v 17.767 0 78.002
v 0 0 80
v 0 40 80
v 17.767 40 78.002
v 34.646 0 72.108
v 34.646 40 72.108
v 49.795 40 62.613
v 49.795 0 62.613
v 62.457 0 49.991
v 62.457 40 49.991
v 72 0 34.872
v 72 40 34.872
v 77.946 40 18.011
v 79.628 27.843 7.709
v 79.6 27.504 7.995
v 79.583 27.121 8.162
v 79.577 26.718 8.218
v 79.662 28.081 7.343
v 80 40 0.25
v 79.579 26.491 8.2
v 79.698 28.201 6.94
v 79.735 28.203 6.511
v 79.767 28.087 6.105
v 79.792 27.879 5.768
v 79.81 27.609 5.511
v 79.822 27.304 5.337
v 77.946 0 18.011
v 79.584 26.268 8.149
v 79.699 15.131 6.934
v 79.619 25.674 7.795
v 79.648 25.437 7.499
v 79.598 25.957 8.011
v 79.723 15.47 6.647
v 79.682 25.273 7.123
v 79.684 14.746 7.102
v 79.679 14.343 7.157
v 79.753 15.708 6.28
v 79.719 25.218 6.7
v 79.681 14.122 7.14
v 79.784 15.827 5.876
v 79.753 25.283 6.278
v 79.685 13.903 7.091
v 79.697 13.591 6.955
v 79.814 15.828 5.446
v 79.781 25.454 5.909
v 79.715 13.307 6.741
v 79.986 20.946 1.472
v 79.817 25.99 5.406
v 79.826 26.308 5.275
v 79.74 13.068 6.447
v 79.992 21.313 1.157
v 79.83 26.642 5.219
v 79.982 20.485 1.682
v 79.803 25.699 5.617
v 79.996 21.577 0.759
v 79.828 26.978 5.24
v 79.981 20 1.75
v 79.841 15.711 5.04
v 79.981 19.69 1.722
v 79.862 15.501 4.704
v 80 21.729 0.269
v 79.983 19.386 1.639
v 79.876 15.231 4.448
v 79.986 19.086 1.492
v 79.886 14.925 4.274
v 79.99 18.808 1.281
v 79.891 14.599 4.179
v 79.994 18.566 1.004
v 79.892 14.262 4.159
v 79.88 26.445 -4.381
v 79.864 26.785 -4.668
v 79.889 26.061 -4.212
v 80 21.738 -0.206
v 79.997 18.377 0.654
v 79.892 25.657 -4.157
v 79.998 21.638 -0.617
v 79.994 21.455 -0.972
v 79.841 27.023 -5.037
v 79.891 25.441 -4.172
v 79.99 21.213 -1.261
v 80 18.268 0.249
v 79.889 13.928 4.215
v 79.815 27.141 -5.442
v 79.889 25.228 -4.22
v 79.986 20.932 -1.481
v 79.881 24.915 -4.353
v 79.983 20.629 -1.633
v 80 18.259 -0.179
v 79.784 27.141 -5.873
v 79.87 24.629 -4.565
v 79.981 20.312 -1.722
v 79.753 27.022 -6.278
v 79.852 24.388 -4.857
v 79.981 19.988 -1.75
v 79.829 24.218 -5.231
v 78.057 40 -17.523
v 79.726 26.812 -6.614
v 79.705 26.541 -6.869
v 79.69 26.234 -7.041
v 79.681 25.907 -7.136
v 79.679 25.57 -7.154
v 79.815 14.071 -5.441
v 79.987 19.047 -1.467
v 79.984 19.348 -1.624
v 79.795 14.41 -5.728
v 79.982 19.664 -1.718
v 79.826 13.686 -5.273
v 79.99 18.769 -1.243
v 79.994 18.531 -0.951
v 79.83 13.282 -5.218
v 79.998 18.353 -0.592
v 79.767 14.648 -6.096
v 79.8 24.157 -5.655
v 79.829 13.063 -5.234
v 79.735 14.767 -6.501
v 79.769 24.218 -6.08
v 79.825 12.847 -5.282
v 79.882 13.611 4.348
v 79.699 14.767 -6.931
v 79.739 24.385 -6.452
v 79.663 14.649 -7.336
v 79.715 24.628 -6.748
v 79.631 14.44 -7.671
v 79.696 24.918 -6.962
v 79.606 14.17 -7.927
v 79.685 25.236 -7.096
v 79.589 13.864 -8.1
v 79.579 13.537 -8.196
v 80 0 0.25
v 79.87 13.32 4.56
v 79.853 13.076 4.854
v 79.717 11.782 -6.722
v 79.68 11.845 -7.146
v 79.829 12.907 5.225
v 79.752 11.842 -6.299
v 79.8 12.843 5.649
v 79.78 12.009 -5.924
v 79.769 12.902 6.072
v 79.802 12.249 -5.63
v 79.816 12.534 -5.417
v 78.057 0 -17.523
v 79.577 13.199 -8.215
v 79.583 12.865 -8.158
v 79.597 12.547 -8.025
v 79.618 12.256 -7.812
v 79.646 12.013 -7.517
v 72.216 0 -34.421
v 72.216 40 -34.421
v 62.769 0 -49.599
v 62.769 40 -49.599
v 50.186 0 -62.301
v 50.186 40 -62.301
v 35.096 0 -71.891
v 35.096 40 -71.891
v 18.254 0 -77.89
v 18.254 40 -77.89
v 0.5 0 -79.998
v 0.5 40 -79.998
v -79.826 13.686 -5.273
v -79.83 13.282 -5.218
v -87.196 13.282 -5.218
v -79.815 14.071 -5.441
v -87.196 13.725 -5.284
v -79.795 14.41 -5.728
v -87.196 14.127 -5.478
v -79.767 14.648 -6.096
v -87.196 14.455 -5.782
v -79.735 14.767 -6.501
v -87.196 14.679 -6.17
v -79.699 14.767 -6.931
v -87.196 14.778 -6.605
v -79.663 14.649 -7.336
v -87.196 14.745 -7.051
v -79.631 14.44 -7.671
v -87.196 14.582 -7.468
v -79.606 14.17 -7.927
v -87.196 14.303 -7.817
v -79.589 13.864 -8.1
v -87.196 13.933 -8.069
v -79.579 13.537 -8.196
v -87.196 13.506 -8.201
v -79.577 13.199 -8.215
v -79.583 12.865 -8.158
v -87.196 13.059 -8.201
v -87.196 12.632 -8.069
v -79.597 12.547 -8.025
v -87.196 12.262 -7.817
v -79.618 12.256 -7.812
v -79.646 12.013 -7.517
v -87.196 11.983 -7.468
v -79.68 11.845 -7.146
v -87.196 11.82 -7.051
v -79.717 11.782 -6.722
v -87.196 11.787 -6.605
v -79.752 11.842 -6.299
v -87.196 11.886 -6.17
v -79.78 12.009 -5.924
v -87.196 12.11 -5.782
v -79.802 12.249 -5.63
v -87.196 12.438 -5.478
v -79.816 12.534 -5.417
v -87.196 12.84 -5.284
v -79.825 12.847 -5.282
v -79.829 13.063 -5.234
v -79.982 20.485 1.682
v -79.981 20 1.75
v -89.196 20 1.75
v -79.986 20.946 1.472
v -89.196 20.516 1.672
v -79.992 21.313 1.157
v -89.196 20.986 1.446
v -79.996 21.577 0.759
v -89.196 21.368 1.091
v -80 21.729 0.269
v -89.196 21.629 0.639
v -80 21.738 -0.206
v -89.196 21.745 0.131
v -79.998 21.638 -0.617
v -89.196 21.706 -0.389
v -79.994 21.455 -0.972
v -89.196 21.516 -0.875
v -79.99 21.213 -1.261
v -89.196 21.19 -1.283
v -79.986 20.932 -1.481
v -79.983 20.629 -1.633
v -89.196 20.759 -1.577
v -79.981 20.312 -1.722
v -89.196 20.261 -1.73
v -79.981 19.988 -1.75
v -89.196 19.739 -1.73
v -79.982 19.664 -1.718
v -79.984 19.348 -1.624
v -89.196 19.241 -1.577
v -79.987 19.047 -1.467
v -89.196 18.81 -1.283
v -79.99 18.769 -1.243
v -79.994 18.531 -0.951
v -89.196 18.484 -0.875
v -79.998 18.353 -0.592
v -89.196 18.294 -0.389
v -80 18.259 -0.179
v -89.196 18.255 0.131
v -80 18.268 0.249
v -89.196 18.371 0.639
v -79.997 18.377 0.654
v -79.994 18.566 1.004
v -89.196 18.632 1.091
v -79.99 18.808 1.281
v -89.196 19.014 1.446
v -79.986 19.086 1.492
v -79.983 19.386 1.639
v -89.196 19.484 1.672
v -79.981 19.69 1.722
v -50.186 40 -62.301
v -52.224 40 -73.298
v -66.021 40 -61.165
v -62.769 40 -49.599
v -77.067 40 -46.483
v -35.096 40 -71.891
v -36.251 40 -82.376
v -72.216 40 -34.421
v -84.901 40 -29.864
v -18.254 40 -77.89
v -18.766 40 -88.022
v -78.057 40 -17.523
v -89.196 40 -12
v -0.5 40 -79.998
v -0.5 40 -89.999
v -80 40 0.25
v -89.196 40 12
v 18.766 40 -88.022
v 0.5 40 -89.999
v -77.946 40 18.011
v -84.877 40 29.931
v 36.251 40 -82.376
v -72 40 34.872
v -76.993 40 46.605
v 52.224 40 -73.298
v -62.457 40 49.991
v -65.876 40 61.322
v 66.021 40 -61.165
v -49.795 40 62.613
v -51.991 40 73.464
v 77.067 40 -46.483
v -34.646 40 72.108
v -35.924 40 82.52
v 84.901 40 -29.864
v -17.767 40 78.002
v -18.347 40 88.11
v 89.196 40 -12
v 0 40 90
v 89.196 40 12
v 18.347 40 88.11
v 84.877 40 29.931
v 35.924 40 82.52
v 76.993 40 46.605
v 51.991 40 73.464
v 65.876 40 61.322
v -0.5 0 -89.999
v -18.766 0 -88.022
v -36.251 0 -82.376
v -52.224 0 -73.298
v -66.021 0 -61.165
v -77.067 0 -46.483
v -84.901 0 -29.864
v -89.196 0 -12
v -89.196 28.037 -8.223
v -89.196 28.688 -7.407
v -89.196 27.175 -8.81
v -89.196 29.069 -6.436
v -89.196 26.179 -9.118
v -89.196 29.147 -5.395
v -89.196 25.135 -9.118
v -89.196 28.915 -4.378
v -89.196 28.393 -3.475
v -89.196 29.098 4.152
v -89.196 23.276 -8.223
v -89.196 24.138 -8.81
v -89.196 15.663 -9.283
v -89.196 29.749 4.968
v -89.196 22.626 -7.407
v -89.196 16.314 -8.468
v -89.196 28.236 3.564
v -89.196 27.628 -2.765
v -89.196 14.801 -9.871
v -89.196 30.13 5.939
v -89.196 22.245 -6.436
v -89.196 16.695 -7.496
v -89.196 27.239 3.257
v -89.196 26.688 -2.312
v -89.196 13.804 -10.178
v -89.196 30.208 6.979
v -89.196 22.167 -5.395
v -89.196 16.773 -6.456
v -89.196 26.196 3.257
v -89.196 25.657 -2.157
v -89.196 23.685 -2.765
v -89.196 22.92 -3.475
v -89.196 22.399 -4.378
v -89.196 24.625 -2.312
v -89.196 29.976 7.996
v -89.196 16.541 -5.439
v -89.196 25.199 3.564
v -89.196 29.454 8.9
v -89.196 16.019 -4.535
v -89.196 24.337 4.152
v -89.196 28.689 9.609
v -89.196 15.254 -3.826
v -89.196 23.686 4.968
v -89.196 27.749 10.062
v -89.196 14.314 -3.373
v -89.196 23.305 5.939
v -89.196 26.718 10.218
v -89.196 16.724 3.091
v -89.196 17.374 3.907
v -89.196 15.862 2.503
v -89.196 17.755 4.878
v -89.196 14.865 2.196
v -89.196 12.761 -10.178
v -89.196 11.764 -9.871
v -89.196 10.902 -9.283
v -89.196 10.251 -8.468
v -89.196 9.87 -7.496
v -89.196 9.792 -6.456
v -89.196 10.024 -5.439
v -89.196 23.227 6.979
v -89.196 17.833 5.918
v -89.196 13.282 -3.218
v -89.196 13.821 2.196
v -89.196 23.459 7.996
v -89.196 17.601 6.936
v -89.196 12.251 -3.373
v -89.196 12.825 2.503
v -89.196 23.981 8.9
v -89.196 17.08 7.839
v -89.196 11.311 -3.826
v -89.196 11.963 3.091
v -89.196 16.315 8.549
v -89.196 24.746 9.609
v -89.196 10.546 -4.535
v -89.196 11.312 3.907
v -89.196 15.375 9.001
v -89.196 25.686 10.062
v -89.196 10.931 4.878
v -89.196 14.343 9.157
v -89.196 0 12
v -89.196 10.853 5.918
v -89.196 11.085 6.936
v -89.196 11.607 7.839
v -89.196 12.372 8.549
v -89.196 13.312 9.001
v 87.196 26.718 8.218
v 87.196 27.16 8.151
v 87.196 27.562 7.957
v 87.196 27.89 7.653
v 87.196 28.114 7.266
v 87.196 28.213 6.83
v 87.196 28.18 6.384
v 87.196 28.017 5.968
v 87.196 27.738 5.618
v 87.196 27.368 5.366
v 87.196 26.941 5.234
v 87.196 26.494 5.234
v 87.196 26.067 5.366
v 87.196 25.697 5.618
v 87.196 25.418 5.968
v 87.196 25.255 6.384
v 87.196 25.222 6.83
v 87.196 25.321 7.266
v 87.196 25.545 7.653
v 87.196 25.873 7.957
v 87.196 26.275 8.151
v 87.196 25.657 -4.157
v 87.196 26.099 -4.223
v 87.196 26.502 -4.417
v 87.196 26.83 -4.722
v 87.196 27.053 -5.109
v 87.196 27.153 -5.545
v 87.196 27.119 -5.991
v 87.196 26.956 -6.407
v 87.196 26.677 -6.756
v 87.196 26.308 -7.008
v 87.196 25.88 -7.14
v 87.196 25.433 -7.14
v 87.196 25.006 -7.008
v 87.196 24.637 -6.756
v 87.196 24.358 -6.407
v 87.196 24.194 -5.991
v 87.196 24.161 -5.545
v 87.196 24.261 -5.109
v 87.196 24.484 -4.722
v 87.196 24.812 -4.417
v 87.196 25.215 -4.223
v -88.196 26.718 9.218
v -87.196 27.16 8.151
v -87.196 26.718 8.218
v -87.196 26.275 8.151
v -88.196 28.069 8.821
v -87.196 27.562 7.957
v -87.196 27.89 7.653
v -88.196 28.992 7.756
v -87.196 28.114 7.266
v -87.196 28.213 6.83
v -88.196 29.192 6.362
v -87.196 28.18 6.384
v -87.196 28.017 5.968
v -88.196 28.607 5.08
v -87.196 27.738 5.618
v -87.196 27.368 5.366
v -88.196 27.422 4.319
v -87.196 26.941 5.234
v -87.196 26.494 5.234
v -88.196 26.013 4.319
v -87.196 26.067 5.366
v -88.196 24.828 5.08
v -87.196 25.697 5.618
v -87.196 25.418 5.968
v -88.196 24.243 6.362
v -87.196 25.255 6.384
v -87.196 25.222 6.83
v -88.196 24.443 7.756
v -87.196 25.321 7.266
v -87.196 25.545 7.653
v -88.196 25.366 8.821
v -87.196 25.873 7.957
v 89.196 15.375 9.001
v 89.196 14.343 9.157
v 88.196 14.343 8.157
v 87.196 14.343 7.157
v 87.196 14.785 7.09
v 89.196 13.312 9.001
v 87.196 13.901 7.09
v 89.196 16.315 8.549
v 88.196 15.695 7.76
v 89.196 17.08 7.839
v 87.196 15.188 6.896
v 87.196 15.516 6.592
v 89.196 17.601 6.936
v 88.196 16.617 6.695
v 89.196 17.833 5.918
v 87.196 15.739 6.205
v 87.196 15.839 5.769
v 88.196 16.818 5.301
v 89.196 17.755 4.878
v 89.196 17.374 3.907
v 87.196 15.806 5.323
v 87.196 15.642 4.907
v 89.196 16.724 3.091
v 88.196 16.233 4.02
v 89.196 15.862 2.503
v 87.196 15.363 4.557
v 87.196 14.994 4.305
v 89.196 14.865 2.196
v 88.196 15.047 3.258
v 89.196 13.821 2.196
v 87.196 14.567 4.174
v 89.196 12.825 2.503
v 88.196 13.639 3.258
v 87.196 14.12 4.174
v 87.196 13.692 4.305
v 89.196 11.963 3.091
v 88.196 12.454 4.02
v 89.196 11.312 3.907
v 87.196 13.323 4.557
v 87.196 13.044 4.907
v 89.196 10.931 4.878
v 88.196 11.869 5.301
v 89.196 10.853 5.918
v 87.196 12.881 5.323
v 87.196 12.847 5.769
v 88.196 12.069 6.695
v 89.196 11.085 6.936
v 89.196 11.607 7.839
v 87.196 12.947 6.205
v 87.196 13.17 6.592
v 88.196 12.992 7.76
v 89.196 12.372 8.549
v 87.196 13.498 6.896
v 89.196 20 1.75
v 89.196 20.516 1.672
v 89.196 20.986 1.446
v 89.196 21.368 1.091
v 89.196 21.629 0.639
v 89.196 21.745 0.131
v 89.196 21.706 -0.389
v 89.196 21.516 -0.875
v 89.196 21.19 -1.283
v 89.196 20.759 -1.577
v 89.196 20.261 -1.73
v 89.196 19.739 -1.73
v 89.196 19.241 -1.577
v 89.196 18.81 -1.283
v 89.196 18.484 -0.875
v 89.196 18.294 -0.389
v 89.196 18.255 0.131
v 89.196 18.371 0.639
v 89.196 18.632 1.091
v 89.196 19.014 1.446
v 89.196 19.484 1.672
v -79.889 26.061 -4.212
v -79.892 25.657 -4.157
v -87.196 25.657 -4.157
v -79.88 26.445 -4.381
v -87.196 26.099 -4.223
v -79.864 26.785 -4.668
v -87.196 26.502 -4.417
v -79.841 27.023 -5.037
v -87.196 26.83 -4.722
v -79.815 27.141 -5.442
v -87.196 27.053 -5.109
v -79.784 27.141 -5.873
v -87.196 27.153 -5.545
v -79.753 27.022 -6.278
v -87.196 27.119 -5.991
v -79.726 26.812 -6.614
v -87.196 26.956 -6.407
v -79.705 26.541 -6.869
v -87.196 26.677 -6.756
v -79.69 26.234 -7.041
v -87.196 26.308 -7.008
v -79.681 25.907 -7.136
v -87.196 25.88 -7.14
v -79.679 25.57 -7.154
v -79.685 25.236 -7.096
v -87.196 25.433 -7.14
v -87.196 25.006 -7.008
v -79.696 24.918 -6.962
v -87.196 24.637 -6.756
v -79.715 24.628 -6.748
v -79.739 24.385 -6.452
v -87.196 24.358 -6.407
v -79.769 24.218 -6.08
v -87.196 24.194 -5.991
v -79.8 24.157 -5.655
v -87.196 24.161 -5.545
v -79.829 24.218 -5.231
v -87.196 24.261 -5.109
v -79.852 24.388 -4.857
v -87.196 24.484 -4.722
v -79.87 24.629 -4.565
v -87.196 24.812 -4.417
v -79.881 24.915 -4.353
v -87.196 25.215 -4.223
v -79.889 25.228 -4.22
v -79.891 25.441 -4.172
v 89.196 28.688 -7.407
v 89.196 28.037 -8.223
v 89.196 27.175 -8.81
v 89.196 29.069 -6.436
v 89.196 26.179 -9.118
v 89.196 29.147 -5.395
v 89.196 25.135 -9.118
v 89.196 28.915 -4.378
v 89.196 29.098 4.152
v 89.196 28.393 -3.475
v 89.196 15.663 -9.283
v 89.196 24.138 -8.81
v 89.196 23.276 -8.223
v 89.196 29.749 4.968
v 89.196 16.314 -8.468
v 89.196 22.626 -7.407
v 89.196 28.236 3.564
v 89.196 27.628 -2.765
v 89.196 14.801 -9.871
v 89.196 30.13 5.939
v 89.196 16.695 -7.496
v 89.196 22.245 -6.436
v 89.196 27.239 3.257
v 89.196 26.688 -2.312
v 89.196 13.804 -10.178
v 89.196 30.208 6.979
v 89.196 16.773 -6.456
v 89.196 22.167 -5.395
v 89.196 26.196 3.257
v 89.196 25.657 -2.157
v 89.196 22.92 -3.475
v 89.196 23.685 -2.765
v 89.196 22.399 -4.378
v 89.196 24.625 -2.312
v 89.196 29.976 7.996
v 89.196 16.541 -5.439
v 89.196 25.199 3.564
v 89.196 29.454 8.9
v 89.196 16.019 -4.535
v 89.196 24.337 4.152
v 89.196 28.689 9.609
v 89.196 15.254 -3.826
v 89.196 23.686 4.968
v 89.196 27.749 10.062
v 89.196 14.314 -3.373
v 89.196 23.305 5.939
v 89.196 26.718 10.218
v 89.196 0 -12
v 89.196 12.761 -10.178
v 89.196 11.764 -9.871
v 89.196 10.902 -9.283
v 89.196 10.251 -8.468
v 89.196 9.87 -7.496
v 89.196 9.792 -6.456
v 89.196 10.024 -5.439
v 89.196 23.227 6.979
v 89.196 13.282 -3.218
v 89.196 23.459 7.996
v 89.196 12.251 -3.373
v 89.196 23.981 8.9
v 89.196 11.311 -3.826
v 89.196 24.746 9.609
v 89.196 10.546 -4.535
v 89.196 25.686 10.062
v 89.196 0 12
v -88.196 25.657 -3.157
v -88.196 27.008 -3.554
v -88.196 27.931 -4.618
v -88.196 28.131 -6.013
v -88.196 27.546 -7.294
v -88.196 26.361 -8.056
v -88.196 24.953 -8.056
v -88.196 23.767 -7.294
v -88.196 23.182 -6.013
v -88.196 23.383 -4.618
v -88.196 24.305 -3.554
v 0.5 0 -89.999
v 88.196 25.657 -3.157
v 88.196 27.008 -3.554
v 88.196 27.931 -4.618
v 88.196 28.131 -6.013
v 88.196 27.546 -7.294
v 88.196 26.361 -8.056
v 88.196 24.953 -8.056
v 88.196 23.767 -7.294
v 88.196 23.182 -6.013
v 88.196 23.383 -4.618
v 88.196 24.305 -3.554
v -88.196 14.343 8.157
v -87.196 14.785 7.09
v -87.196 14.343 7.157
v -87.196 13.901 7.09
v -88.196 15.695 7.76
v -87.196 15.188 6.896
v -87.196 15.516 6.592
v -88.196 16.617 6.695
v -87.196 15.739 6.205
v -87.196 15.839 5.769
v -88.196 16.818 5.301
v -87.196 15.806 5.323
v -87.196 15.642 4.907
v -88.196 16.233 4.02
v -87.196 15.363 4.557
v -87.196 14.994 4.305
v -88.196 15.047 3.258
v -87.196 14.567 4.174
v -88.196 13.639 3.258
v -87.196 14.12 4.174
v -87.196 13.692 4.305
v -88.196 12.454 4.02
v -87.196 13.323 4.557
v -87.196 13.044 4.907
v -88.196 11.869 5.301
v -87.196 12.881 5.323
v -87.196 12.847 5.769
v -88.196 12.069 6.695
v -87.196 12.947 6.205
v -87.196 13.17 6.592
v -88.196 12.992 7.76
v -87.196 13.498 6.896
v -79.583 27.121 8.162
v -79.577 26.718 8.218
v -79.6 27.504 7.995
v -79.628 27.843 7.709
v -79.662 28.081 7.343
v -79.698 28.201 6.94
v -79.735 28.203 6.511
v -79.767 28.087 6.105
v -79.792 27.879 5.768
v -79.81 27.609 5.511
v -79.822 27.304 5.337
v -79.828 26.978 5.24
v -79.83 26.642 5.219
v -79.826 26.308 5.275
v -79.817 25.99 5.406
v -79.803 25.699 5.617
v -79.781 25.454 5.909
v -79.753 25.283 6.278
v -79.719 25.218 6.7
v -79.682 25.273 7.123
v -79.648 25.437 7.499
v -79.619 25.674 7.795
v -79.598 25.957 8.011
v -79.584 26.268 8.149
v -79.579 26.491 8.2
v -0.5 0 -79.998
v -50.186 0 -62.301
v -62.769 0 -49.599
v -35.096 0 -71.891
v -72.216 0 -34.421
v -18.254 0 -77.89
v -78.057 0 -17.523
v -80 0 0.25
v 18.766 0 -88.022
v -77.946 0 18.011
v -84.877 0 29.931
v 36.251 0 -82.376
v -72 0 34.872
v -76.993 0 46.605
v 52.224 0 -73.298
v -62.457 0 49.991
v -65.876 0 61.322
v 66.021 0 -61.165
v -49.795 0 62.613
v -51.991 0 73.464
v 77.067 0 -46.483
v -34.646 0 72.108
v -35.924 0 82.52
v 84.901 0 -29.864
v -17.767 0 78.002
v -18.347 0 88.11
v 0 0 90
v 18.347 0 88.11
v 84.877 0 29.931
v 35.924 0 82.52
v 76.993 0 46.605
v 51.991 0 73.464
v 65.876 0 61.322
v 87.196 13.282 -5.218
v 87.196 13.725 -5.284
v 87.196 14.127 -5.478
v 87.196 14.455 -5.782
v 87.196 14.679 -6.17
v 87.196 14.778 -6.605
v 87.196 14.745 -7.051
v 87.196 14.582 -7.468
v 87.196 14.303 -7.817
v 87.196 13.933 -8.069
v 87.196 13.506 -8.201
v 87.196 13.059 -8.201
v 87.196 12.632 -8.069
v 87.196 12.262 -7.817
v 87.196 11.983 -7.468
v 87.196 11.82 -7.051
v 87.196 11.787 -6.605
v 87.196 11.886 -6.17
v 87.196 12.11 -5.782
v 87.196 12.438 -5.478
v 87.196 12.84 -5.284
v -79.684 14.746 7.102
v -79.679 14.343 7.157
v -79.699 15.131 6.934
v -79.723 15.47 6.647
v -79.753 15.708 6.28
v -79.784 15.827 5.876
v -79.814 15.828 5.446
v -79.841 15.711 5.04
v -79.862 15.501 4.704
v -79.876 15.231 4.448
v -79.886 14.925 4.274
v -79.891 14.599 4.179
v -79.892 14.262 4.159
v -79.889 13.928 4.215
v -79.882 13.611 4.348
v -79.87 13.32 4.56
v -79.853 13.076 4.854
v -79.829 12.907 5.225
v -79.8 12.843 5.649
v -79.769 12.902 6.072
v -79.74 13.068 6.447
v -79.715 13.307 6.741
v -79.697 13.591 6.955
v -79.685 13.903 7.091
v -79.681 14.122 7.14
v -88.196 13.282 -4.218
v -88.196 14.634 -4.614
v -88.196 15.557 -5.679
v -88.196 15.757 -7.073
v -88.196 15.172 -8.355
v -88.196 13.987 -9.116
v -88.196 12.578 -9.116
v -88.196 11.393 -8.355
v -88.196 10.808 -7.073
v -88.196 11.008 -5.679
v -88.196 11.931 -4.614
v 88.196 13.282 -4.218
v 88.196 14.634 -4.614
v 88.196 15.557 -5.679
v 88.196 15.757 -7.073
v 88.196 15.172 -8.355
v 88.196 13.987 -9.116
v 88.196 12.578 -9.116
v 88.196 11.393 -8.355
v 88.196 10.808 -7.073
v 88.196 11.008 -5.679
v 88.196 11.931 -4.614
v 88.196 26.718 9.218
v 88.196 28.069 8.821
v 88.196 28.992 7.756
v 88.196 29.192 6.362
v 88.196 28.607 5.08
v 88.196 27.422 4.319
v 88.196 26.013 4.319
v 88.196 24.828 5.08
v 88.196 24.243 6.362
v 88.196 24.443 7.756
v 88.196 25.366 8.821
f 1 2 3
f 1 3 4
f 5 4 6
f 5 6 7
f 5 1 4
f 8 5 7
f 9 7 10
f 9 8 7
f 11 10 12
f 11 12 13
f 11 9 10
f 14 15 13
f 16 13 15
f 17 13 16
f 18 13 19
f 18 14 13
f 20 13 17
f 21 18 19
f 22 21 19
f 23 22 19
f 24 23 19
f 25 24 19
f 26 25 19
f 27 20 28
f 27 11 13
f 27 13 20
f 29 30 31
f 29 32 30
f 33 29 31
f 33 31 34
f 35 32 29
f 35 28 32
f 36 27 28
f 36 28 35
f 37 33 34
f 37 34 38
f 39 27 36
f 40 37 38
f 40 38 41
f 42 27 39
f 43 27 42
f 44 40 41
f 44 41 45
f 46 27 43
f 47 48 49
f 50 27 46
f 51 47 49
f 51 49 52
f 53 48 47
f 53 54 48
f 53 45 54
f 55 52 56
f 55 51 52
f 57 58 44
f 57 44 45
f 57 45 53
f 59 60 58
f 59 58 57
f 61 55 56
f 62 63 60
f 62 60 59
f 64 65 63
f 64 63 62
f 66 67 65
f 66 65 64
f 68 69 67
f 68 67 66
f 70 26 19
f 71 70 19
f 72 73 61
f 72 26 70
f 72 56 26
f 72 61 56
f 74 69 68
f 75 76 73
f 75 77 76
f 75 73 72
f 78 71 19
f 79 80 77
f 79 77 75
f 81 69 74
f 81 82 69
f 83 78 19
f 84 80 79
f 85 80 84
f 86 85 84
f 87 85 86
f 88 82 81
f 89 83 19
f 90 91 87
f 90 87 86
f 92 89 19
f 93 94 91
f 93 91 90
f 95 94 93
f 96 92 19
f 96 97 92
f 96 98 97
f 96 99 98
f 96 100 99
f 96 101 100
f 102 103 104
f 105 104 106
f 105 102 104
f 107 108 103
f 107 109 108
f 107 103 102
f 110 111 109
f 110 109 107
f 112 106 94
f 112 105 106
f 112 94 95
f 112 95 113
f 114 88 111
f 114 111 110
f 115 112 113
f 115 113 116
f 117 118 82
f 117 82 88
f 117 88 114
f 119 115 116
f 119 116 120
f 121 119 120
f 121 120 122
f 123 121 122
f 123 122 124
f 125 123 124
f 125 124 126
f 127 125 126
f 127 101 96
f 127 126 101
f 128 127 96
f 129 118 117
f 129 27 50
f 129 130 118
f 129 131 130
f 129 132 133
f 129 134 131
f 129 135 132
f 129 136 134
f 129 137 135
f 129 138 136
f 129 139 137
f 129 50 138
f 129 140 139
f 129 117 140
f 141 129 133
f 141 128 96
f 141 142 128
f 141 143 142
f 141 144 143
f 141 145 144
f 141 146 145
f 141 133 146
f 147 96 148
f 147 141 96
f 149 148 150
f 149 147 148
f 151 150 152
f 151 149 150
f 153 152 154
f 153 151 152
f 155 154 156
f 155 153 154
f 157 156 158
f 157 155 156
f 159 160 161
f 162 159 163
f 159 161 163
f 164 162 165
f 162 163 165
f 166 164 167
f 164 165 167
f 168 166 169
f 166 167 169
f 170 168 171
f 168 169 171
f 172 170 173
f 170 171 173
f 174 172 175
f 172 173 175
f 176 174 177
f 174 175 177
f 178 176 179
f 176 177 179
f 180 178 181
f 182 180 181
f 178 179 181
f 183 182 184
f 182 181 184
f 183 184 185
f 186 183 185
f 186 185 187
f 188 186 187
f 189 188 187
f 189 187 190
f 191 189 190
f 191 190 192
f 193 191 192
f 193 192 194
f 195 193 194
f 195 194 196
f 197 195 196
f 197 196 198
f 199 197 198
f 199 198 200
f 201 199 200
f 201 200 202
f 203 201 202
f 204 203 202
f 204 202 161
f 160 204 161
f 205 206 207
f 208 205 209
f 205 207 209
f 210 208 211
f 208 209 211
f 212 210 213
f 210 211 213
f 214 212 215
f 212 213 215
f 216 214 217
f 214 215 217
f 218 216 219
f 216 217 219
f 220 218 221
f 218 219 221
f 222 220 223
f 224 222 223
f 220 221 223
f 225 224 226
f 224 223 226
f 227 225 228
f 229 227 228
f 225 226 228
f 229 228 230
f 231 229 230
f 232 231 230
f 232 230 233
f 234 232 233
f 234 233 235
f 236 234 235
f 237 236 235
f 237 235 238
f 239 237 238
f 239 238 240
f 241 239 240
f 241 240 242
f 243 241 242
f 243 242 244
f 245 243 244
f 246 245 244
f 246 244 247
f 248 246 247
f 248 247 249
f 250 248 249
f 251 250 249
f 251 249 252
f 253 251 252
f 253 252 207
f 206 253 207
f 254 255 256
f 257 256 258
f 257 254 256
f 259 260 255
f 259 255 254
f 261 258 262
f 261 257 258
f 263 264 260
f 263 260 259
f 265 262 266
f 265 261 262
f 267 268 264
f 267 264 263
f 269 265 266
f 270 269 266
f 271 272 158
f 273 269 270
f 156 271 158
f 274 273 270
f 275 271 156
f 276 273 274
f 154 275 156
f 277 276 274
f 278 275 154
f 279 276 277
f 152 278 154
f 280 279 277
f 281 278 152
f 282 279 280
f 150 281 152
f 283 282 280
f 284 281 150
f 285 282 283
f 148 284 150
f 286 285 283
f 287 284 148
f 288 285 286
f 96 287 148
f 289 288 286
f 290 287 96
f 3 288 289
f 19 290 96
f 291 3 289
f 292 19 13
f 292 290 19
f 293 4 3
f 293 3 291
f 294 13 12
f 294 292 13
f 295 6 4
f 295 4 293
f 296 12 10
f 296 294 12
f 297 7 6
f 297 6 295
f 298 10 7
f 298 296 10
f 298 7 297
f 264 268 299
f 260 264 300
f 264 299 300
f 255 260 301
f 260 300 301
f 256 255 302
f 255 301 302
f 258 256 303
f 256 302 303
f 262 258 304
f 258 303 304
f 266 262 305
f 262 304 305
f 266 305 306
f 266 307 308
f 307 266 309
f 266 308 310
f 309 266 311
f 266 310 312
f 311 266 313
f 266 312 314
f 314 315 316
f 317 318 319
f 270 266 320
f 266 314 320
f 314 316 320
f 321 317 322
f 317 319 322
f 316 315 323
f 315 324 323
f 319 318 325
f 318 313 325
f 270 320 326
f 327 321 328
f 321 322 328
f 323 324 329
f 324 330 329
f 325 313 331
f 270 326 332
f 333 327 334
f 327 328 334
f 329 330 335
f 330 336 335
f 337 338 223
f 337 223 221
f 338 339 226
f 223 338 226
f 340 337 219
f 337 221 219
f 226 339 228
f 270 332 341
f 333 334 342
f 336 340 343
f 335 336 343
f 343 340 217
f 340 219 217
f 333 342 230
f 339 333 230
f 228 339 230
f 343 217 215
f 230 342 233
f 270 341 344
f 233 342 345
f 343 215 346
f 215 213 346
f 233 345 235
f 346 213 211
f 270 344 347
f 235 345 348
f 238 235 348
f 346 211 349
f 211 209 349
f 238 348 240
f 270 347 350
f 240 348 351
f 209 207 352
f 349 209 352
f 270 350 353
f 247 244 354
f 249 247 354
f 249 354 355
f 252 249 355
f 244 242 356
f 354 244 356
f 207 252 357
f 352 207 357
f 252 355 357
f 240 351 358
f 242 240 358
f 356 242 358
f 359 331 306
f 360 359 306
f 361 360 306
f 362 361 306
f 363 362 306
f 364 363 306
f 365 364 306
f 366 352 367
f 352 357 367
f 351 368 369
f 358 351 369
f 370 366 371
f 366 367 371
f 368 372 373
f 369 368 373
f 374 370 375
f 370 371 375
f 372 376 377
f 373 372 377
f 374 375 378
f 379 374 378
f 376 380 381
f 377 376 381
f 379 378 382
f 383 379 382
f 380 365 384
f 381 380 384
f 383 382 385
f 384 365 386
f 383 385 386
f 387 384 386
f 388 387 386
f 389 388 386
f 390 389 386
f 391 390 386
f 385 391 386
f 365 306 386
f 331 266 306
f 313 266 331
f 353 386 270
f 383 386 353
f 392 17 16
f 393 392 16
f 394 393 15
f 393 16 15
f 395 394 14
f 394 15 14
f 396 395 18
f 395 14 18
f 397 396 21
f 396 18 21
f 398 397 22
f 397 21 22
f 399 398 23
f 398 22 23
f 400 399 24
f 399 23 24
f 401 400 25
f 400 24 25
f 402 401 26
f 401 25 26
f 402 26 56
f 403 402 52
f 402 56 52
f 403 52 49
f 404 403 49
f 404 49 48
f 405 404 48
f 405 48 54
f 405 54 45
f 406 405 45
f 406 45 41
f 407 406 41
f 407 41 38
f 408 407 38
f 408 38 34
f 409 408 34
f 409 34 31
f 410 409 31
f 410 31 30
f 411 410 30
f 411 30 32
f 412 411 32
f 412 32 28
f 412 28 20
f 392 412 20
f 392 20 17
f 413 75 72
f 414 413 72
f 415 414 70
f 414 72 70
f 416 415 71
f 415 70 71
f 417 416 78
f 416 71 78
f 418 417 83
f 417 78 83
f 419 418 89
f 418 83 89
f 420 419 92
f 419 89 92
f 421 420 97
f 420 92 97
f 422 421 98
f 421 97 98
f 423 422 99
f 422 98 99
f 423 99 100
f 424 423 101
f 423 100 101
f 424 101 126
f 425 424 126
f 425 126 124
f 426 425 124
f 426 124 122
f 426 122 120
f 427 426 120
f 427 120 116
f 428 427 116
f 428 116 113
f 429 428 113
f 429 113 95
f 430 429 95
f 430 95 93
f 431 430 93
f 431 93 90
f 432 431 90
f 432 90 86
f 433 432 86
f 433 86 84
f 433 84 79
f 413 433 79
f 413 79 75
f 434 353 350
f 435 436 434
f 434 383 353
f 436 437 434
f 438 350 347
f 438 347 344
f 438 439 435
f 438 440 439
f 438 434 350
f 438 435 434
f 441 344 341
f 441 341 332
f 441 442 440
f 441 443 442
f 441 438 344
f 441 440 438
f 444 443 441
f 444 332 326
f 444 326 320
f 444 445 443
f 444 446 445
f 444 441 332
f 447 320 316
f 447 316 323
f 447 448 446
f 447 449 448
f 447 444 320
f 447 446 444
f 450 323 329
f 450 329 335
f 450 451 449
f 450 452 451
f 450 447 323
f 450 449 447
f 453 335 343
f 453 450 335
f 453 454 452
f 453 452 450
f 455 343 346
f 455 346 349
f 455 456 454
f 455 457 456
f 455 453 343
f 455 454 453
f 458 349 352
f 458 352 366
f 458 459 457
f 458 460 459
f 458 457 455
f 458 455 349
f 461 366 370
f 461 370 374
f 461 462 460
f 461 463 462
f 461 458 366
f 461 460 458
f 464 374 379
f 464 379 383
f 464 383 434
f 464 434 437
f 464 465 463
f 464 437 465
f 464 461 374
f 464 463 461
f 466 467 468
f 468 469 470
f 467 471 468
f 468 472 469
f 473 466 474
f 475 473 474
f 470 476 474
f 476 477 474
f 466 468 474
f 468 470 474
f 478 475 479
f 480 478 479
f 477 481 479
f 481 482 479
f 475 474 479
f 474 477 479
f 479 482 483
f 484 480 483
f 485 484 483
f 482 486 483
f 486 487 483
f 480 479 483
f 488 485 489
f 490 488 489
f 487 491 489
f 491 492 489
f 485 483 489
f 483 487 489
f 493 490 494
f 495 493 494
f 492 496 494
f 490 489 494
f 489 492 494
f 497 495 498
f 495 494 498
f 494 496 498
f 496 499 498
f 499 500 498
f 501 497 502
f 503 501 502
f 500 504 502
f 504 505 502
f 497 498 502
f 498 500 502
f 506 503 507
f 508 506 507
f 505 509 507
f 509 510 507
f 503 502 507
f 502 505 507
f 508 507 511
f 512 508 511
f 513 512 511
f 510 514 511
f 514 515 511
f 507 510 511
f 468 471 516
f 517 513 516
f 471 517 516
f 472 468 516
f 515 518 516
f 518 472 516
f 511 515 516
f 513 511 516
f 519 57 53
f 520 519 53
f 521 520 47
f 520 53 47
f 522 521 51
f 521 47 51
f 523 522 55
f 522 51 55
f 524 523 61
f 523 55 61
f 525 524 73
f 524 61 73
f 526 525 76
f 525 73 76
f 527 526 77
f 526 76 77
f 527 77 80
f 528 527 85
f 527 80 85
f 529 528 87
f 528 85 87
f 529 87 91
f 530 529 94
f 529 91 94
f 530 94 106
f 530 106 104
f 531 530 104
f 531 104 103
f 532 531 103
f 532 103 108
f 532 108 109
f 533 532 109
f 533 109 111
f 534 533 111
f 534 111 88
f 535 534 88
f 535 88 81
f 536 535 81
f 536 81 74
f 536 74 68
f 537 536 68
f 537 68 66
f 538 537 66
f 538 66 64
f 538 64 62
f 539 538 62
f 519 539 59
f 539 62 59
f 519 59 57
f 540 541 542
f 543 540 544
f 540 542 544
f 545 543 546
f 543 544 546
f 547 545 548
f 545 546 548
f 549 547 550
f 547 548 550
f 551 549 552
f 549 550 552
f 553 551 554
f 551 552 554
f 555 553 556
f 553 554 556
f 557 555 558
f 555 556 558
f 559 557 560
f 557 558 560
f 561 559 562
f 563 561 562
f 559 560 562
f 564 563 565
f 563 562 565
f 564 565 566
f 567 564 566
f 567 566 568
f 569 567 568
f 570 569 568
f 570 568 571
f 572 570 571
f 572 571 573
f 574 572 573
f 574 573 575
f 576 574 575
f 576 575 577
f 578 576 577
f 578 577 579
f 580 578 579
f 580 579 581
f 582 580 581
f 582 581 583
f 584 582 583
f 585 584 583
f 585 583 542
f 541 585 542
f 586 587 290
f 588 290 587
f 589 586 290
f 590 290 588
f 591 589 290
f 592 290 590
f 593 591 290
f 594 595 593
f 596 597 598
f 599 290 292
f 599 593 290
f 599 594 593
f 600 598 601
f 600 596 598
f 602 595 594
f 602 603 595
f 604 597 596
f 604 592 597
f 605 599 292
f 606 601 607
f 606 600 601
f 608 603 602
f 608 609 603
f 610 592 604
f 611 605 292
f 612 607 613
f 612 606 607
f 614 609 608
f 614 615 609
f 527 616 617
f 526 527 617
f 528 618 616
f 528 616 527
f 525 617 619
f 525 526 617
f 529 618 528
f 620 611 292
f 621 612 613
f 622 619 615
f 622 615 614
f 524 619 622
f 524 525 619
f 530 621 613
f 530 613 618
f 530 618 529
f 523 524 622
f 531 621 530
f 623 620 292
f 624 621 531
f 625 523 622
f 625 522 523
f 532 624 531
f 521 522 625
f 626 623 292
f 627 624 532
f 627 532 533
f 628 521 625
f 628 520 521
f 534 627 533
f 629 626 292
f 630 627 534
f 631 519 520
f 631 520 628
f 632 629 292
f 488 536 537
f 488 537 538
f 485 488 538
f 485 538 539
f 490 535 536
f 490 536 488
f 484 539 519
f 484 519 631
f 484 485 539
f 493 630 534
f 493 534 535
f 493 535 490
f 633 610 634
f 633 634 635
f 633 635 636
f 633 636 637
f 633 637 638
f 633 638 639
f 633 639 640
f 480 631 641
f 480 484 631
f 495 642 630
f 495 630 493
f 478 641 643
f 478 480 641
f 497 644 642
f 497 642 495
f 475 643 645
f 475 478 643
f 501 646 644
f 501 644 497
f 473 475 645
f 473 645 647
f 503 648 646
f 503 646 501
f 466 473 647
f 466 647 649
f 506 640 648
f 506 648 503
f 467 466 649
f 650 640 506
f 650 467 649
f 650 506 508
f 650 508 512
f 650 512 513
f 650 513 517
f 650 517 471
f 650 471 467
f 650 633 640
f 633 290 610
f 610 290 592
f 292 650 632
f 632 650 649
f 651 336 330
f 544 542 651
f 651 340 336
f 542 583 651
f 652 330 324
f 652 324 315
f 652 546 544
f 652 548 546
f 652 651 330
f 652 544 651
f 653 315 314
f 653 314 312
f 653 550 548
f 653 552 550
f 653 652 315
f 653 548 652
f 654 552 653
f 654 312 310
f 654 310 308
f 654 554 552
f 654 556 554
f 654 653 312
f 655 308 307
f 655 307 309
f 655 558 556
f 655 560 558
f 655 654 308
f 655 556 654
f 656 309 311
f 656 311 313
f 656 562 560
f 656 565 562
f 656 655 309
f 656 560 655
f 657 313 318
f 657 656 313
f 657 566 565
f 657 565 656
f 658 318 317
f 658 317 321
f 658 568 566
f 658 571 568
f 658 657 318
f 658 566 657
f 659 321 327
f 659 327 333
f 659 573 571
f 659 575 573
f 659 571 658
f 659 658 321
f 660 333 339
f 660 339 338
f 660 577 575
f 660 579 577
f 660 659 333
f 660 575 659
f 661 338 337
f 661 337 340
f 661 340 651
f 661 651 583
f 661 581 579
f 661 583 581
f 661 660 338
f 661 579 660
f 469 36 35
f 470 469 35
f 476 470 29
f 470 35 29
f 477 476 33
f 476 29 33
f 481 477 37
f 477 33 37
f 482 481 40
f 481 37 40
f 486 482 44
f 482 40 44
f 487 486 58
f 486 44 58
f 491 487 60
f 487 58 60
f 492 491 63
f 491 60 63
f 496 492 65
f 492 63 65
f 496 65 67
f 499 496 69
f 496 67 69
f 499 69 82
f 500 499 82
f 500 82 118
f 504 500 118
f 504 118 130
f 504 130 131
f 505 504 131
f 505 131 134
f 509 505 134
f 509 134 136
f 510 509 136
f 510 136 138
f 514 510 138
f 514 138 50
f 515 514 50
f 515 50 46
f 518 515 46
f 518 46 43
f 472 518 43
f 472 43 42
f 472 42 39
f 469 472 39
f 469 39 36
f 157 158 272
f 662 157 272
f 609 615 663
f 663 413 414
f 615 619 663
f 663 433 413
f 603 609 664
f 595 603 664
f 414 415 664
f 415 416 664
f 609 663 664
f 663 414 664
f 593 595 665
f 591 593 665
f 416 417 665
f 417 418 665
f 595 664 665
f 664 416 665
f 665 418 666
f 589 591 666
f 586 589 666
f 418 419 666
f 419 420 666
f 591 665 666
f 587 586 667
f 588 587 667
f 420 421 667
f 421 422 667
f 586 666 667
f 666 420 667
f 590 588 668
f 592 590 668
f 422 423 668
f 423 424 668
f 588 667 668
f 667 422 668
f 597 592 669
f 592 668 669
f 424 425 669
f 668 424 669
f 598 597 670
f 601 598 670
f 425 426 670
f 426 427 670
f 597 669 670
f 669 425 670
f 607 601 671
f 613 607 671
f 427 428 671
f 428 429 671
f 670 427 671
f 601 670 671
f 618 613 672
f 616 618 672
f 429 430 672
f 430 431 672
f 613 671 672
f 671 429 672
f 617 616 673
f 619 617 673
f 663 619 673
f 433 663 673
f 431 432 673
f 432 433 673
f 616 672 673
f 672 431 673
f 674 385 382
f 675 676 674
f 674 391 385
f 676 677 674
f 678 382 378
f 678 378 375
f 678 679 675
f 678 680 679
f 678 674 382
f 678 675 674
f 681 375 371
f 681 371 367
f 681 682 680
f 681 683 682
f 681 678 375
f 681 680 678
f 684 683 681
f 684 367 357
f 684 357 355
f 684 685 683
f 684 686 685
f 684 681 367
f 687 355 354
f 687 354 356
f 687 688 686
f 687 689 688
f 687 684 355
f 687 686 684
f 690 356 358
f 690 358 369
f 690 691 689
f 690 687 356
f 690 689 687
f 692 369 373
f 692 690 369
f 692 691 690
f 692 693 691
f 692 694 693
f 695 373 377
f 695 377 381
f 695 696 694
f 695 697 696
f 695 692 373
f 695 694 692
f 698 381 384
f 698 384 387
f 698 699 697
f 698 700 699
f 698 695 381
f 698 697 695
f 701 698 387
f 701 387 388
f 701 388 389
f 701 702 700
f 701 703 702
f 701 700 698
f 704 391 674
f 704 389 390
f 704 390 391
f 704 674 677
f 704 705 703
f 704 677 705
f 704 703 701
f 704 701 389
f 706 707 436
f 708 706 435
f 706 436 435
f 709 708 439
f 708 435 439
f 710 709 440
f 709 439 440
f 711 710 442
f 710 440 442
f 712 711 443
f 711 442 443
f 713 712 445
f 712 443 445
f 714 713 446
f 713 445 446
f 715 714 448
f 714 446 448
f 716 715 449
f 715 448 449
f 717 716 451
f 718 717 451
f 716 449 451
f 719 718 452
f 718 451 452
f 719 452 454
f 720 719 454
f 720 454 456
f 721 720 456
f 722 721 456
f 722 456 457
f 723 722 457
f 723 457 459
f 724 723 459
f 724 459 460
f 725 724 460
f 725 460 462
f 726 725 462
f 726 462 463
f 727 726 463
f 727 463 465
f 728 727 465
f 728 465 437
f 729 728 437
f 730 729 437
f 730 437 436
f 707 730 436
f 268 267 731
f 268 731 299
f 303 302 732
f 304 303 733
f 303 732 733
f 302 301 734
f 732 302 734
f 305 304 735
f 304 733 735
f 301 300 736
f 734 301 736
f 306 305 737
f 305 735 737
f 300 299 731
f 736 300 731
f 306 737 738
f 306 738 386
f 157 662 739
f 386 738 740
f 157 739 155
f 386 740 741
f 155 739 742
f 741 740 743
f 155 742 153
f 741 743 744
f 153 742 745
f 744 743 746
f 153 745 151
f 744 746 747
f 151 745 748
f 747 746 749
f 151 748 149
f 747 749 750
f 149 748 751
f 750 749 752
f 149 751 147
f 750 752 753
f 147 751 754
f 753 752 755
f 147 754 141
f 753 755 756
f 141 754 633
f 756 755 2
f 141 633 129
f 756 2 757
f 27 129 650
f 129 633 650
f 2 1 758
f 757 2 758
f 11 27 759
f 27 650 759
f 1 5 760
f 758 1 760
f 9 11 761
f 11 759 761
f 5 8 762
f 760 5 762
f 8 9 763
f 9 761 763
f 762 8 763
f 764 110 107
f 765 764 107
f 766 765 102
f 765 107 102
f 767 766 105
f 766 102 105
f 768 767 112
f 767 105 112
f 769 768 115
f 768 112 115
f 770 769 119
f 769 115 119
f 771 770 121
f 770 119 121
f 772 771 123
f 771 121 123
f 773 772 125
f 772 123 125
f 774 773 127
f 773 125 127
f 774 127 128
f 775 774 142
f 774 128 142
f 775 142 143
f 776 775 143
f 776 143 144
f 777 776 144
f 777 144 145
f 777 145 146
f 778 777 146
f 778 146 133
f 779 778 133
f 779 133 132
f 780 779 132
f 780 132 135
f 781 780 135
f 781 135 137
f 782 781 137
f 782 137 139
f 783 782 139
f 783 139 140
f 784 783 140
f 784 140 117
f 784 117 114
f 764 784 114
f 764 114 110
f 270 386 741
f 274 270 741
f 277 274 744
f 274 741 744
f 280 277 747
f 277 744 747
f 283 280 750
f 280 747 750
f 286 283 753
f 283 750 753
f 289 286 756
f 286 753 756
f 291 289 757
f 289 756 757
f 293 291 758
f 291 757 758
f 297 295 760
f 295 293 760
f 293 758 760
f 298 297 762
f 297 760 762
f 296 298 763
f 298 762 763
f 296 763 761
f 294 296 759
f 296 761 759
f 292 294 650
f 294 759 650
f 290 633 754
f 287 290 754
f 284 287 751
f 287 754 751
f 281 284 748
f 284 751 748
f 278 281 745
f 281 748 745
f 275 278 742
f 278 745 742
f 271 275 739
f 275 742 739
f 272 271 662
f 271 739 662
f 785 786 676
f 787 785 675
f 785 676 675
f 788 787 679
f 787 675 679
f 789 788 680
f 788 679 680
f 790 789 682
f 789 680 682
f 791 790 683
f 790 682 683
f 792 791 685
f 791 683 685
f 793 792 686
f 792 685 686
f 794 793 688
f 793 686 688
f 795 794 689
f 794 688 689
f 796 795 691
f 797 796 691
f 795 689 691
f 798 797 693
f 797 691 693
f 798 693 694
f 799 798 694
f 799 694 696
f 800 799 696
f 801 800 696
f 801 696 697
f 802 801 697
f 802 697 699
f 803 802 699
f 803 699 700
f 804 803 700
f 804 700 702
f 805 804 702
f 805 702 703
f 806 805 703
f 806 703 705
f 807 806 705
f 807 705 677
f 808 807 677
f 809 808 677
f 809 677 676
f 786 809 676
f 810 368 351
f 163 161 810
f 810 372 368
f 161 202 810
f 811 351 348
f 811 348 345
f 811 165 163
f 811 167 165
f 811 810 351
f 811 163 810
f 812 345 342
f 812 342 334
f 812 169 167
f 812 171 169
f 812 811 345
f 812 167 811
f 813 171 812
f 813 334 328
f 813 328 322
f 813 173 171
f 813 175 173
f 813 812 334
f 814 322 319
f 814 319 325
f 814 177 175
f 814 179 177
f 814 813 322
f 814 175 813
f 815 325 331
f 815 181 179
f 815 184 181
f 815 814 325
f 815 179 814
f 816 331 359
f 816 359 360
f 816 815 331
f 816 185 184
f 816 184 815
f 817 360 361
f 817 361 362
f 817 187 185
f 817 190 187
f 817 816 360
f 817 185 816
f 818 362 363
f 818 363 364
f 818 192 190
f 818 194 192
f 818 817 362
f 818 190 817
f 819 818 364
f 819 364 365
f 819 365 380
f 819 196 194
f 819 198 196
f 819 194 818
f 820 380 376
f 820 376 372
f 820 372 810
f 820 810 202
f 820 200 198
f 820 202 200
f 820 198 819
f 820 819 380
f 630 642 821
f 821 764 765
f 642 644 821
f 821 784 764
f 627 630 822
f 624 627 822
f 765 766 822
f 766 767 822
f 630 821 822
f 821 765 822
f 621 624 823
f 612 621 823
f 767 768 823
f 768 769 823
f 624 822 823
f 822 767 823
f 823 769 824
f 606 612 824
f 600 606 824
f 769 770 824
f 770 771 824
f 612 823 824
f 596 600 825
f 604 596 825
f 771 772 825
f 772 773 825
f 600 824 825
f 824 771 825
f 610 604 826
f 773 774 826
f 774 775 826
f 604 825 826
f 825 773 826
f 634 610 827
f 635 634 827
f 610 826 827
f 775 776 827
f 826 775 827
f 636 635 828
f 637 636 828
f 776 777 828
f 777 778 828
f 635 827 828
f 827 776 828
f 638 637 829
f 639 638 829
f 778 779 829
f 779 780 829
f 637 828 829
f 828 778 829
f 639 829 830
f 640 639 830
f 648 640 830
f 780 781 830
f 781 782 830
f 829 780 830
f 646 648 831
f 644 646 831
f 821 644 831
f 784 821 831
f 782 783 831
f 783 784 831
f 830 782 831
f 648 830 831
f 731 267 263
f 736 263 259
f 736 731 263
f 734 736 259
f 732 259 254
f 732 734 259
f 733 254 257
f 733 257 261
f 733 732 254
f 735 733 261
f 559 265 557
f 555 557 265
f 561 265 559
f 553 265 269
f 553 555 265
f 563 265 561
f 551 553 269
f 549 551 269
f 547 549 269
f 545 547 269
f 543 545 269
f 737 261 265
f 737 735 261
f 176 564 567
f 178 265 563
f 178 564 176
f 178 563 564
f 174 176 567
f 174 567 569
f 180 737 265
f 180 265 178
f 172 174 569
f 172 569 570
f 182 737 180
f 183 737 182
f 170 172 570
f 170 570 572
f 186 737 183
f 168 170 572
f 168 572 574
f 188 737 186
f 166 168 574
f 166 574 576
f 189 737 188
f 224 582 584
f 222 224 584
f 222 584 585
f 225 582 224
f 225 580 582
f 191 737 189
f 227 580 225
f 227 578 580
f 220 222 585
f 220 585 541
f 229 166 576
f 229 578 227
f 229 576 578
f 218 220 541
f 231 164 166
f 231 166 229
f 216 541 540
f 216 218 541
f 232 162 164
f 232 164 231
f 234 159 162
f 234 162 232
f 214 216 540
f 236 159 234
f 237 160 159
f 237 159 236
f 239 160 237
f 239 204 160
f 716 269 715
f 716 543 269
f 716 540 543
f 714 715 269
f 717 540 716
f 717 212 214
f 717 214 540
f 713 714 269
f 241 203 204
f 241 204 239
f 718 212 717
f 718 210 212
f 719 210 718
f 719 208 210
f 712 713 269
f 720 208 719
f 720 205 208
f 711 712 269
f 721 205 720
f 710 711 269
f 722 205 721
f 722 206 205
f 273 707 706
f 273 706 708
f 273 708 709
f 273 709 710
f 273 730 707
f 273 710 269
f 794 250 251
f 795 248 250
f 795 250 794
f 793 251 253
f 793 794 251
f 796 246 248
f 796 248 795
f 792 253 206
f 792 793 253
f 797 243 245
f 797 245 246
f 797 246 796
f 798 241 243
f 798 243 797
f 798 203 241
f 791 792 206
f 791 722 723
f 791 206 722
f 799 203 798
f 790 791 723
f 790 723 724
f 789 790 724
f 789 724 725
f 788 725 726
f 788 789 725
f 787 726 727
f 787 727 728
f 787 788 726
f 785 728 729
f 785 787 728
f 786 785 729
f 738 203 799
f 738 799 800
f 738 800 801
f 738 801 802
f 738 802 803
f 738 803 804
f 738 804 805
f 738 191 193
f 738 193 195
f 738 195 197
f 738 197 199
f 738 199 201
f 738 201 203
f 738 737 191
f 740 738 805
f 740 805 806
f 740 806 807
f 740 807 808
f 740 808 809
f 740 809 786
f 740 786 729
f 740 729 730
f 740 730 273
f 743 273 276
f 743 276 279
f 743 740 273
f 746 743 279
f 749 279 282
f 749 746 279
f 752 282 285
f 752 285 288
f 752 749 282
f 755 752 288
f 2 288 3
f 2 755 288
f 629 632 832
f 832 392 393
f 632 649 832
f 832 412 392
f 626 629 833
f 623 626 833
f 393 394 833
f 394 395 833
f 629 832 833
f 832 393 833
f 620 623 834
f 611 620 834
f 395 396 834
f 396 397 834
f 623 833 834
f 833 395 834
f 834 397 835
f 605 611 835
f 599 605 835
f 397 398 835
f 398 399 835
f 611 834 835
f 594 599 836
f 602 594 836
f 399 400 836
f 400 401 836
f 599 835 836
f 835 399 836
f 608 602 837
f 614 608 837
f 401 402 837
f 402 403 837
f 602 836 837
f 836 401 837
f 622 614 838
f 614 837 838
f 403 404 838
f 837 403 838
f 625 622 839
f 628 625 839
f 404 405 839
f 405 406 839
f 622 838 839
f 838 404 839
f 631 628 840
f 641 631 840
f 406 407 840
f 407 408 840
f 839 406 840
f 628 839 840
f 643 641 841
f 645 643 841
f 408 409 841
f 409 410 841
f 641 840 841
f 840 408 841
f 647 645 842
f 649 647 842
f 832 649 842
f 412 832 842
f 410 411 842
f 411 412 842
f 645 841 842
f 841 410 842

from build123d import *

# Parameters (mm, degrees)
SKETCH1_R               = 90
SKETCH1_R_2             = 80
BOSS_EXTRUDE1_DEPTH     = 40
CUT_EXTRUDE1_START      = -70
CUT_EXTRUDE1_DEPTH      = 70
SKETCH3_R               = 1.5
SKETCH3_R_2             = 1.75
CUT_EXTRUDE2_DEPTH      = 212
CHAMFER1_SIZE           = 2
CUT_EXTRUDE4_DEPTH      = 133.875882032
CUT_EXTRUDE4_DEPTH_BACK = 10
SKETCH4_W               = 1
SKETCH4_H               = 86.76850885


with BuildPart() as part:
    # Sketch1 → Boss-Extrude1 (new body)
    with BuildSketch(Plane(origin=(0, 0, 0), x_dir=(1, 0, 0), z_dir=(0, 1, 0))):
        with Locations(Location((0, 0, 0), (0, 0, 270))):
            Circle(SKETCH1_R)
        with Locations(Location((0, 0, 0), (0, 0, 270))):
            Circle(SKETCH1_R_2, mode=Mode.SUBTRACT)
    extrude(amount=BOSS_EXTRUDE1_DEPTH)

    # Sketch2 → Cut-Extrude1 (cut)
    with BuildSketch(Plane(origin=(0, 40, 0), x_dir=(1, 0, 0), z_dir=(0, 1, 0)).offset(CUT_EXTRUDE1_START)):
        with BuildLine():
            Line((-89.196412484, 12), (-89.196412484, -12))
            ThreePointArc((-89.196412484, -12), (-90, 0), (-89.196412484, 12))
        make_face()
        with BuildLine():
            Line((89.196412484, 12), (89.196412484, -12))
            ThreePointArc((89.196412484, -12), (90, 0), (89.196412484, 12))
        make_face()
    extrude(amount=CUT_EXTRUDE1_DEPTH, mode=Mode.SUBTRACT)

    # Sketch3 → Cut-Extrude2 (cut)
    with BuildSketch(Plane.ZY.offset(89.196412484)):
        with Locations((6.717514421, 26.717514421)):
            Circle(SKETCH3_R)
        with Locations((-5.656854249, 25.656854249)):
            Circle(SKETCH3_R)
        with Locations((-6.717514421, 13.282485579)):
            Circle(SKETCH3_R)
        with Locations((5.656854249, 14.343145751)):
            Circle(SKETCH3_R)
        with Locations((0, 20)):
            Circle(SKETCH3_R_2)
    extrude(amount=-CUT_EXTRUDE2_DEPTH, mode=Mode.SUBTRACT)

    # Chamfer1
    chamfer1_edges = [part.edges().sort_by_distance(p)[0] for p in [
        (89.196412484, 13.282485579, -8.217514421),
        (-89.196412484, 13.282485579, -8.217514421),
        (89.196412484, 26.717514421, 5.217514421),
        (-89.196412484, 26.717514421, 5.217514421),
        (89.196412484, 14.343145751, 4.156854249),
        (-89.196412484, 14.343145751, 4.156854249),
        (89.196412484, 25.656854249, -7.156854249),
        (-89.196412484, 25.656854249, -7.156854249),
    ]]
    chamfer(chamfer1_edges, length=CHAMFER1_SIZE)

    # Sketch4 → Cut-Extrude4 (cut, two sides: drawn at the far end of the back side and taken through both)
    with BuildSketch(Plane(origin=(0, 0, 0), x_dir=(1, 0, 0), z_dir=(0, 1, 0)).offset(-CUT_EXTRUDE4_DEPTH_BACK)):
        with Locations((0, 48.982222738)):
            Rectangle(SKETCH4_W, SKETCH4_H)
    extrude(amount=CUT_EXTRUDE4_DEPTH + CUT_EXTRUDE4_DEPTH_BACK, mode=Mode.SUBTRACT)


solid = part.part
